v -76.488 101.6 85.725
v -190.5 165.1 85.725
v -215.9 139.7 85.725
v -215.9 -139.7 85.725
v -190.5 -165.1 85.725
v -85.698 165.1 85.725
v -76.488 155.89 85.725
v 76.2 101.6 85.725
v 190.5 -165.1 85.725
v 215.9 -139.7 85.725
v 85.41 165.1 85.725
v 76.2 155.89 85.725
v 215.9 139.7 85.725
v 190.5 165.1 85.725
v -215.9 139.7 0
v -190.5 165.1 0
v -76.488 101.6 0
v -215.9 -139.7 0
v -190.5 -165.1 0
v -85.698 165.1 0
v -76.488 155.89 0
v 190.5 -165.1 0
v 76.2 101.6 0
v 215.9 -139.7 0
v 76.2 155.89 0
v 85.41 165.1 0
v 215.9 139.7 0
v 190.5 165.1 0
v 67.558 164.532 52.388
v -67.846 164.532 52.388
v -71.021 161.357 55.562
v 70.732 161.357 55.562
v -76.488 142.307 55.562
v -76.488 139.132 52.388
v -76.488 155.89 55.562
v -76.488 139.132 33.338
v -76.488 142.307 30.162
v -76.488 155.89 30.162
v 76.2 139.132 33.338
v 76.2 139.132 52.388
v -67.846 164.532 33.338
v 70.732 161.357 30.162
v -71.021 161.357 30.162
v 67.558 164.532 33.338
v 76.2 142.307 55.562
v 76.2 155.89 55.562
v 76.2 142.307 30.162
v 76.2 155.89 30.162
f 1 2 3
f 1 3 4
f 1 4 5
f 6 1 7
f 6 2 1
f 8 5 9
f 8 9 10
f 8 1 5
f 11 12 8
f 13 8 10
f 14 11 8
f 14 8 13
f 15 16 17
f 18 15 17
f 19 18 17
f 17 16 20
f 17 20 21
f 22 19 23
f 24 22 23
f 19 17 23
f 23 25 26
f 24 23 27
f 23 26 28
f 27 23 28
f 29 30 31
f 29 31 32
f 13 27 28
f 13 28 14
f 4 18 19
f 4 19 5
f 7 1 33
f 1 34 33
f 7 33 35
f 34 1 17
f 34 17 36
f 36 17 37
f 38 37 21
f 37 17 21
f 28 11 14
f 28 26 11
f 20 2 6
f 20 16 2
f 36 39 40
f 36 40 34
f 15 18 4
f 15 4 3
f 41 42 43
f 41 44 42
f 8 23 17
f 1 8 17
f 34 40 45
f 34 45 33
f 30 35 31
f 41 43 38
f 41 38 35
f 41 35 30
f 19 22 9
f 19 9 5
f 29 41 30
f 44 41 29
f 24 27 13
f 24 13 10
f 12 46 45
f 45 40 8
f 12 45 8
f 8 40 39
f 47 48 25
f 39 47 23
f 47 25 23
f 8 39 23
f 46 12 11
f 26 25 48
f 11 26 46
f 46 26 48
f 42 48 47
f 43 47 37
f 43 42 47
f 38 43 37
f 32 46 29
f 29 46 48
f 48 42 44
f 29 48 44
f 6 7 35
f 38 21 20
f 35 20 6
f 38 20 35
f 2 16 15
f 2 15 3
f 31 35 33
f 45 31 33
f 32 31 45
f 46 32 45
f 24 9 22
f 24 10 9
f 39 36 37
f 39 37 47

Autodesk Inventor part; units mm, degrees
ref_plane "YZ Plane" through (0, 0, 0) normal (1, 0, 0) x (0, 1, 0)
ref_plane "XZ Plane" through (0, 0, 0) normal (0, 1, 0) x (-1, 0, 0)
ref_plane "XY Plane" through (0, 0, 0) normal (0, 0, 1) x (1, 0, 0)
sketch "Sketch1" plane through (0, 0, 0) normal (0, 0, 1) x (1, 0, 0)
  line L0 (215.9, -165.1) -> (-215.9, -165.1)
  line L1 (-215.9, -165.1) -> (-215.9, 165.1)
  line L2 (215.9, 165.1) -> (215.9, -165.1)
  line L3 (215.9, -165.1) -> (-215.9, 165.1) construction
  line L4 (-215.9, -165.1) -> (215.9, 165.1) construction
  line L5 (76.2, 101.6) -> (-76.4881, 101.6)
  line L6 (-76.2, 191.0151) -> (76.2, 101.6) construction
  line L7 (76.2, 191.0151) -> (-76.4881, 101.6) construction
  line L8 (66.0896, 101.6) -> (-66.0896, 101.6)
  line L9 (-67.8456, 164.5323) -> (67.5575, 164.5323)
  line L10 (76.2, 139.1323) -> (-76.4881, 139.1323)
  line L11 (-76.4881, 155.8898) -> (-67.8456, 164.5323)
  line L12 (-0.144, 139.1323) -> (-0.144, 146.3921)
  line L13 (76.2, 155.8898) -> (67.5575, 164.5323)
  line L14 (-215.9, 165.1) -> (-85.6983, 165.1)
  line L15 (-67.8456, 164.5323) -> (67.5575, 164.5323)
  line L16 (85.4102, 165.1) -> (215.9, 165.1)
  line L17 (76.2, 139.1323) -> (76.2, 101.6)
  line L18 (-76.4881, 101.6) -> (-76.4881, 139.1323)
  line L19 (-76.4881, 155.8898) -> (-85.6983, 165.1)
  line L20 (76.2, 155.8898) -> (85.4102, 165.1)
  point P0 (0, 0)
  point P1 (-0.072, 146.3498)
  dimension "d0" = 431.8
  dimension "d1" = 330.2
  dimension "d7" = 266.7
  dimension "d11" = 25.4
  dimension "d12" = 45
extrude "Extrusion1" add sketch "Sketch1" along normal blind 85.725
chamfer "Chamfer1" distance 25.4 angle 45 4 edges at (215.9, 165.1, 42.8625) (215.9, -165.1, 42.8625) (-215.9, -165.1, 42.8625) (-215.9, 165.1, 42.8625)
sketch "Sketch2" plane through (0, 0, 85.725) normal (0, 0, 1) x (1, 0, 0)
  line L0 (76.2, 139.1323) -> (76.2, 101.6) projected
  line L1 (76.2, 101.6) -> (-76.4881, 101.6) projected
  line L2 (-76.4881, 101.6) -> (-76.4881, 139.1323) projected
  line L3 (-215.9, 139.7) -> (-190.5, 165.1) projected
  line L4 (-215.9, 139.7) -> (-215.9, -139.7) projected
  line L5 (-190.5, -165.1) -> (-215.9, -139.7) projected
  line L6 (-190.5, -165.1) -> (190.5, -165.1) projected
  line L7 (215.9, -139.7) -> (190.5, -165.1) projected
  line L8 (215.9, -139.7) -> (215.9, 139.7) projected
  line L9 (190.5, 165.1) -> (215.9, 139.7) projected
  line L10 (190.5, 165.1) -> (85.4102, 165.1) projected
  line L11 (85.4102, 165.1) -> (76.2, 155.8898) projected
  line L12 (76.2, 155.8898) -> (67.5575, 164.5323) projected
  line L13 (67.5575, 164.5323) -> (-67.8456, 164.5323) projected
  line L14 (-67.8456, 164.5323) -> (-76.4881, 155.8898) projected
  line L15 (-76.4881, 155.8898) -> (-85.6983, 165.1) projected
  line L16 (-85.6983, 165.1) -> (-190.5, 165.1) projected
  line L17 (-76.4881, 139.1323) -> (76.2, 139.1323) projected
  line L18 (-76.4881, 139.1323) -> (-76.4881, 155.8898)
  line L19 (76.2, 139.1323) -> (76.2, 155.8898)
  point P0 (0, 0)
extrude "Extrusion2" cut sketch "Sketch2" against normal blind 30.1625 contours L17 L18 L14 L13 L12 L19
sketch "Sketch3" plane through (0, 0, 0) normal (0, 0, -1) x (-1, 0, 0)
  line L0 (76.4881, 139.1323) -> (76.4881, 101.6) projected
  line L1 (76.4881, 101.6) -> (-76.2, 101.6) projected
  line L2 (-76.2, 101.6) -> (-76.2, 139.1323) projected
  line L3 (-76.2, 139.1323) -> (76.4881, 139.1323) projected
  line L4 (190.5, 165.1) -> (215.9, 139.7) projected
  line L5 (85.6983, 165.1) -> (190.5, 165.1) projected
  line L6 (76.4881, 155.8898) -> (85.6983, 165.1) projected
  line L7 (67.8456, 164.5323) -> (76.4881, 155.8898) projected
  line L8 (-67.5575, 164.5323) -> (67.8456, 164.5323) projected
  line L9 (-76.2, 155.8898) -> (-67.5575, 164.5323) projected
  line L10 (-85.4102, 165.1) -> (-76.2, 155.8898) projected
  line L11 (-190.5, 165.1) -> (-85.4102, 165.1) projected
  line L12 (-215.9, 139.7) -> (-190.5, 165.1) projected
  line L13 (-215.9, -139.7) -> (-215.9, 139.7) projected
  line L14 (-190.5, -165.1) -> (-215.9, -139.7) projected
  line L15 (190.5, -165.1) -> (-190.5, -165.1) projected
  line L16 (215.9, -139.7) -> (190.5, -165.1) projected
  line L17 (215.9, 139.7) -> (215.9, -139.7) projected
  line L18 (-76.2, 139.1323) -> (76.4881, 139.1323) projected
  line L19 (-76.2, 139.1323) -> (-76.2, 155.8898)
  line L20 (76.4881, 101.6) -> (76.4881, 155.8898) projected
  line L21 (76.4881, 139.1323) -> (76.4881, 155.8898)
  point P0 (0, 0)
extrude "Extrusion3" cut sketch "Sketch3" against normal blind 30.1625 contours L3 L19 L9 L8 L7 L20
chamfer "Chamfer2" distance 3.175 angle 45 4 edges at (-0.144, 139.1323, 55.5625) (-0.144, 139.1323, 30.1625) (-0.144, 164.5323, 55.5625) (-0.144, 164.5323, 30.1625)
properties part number "Divider_box"
